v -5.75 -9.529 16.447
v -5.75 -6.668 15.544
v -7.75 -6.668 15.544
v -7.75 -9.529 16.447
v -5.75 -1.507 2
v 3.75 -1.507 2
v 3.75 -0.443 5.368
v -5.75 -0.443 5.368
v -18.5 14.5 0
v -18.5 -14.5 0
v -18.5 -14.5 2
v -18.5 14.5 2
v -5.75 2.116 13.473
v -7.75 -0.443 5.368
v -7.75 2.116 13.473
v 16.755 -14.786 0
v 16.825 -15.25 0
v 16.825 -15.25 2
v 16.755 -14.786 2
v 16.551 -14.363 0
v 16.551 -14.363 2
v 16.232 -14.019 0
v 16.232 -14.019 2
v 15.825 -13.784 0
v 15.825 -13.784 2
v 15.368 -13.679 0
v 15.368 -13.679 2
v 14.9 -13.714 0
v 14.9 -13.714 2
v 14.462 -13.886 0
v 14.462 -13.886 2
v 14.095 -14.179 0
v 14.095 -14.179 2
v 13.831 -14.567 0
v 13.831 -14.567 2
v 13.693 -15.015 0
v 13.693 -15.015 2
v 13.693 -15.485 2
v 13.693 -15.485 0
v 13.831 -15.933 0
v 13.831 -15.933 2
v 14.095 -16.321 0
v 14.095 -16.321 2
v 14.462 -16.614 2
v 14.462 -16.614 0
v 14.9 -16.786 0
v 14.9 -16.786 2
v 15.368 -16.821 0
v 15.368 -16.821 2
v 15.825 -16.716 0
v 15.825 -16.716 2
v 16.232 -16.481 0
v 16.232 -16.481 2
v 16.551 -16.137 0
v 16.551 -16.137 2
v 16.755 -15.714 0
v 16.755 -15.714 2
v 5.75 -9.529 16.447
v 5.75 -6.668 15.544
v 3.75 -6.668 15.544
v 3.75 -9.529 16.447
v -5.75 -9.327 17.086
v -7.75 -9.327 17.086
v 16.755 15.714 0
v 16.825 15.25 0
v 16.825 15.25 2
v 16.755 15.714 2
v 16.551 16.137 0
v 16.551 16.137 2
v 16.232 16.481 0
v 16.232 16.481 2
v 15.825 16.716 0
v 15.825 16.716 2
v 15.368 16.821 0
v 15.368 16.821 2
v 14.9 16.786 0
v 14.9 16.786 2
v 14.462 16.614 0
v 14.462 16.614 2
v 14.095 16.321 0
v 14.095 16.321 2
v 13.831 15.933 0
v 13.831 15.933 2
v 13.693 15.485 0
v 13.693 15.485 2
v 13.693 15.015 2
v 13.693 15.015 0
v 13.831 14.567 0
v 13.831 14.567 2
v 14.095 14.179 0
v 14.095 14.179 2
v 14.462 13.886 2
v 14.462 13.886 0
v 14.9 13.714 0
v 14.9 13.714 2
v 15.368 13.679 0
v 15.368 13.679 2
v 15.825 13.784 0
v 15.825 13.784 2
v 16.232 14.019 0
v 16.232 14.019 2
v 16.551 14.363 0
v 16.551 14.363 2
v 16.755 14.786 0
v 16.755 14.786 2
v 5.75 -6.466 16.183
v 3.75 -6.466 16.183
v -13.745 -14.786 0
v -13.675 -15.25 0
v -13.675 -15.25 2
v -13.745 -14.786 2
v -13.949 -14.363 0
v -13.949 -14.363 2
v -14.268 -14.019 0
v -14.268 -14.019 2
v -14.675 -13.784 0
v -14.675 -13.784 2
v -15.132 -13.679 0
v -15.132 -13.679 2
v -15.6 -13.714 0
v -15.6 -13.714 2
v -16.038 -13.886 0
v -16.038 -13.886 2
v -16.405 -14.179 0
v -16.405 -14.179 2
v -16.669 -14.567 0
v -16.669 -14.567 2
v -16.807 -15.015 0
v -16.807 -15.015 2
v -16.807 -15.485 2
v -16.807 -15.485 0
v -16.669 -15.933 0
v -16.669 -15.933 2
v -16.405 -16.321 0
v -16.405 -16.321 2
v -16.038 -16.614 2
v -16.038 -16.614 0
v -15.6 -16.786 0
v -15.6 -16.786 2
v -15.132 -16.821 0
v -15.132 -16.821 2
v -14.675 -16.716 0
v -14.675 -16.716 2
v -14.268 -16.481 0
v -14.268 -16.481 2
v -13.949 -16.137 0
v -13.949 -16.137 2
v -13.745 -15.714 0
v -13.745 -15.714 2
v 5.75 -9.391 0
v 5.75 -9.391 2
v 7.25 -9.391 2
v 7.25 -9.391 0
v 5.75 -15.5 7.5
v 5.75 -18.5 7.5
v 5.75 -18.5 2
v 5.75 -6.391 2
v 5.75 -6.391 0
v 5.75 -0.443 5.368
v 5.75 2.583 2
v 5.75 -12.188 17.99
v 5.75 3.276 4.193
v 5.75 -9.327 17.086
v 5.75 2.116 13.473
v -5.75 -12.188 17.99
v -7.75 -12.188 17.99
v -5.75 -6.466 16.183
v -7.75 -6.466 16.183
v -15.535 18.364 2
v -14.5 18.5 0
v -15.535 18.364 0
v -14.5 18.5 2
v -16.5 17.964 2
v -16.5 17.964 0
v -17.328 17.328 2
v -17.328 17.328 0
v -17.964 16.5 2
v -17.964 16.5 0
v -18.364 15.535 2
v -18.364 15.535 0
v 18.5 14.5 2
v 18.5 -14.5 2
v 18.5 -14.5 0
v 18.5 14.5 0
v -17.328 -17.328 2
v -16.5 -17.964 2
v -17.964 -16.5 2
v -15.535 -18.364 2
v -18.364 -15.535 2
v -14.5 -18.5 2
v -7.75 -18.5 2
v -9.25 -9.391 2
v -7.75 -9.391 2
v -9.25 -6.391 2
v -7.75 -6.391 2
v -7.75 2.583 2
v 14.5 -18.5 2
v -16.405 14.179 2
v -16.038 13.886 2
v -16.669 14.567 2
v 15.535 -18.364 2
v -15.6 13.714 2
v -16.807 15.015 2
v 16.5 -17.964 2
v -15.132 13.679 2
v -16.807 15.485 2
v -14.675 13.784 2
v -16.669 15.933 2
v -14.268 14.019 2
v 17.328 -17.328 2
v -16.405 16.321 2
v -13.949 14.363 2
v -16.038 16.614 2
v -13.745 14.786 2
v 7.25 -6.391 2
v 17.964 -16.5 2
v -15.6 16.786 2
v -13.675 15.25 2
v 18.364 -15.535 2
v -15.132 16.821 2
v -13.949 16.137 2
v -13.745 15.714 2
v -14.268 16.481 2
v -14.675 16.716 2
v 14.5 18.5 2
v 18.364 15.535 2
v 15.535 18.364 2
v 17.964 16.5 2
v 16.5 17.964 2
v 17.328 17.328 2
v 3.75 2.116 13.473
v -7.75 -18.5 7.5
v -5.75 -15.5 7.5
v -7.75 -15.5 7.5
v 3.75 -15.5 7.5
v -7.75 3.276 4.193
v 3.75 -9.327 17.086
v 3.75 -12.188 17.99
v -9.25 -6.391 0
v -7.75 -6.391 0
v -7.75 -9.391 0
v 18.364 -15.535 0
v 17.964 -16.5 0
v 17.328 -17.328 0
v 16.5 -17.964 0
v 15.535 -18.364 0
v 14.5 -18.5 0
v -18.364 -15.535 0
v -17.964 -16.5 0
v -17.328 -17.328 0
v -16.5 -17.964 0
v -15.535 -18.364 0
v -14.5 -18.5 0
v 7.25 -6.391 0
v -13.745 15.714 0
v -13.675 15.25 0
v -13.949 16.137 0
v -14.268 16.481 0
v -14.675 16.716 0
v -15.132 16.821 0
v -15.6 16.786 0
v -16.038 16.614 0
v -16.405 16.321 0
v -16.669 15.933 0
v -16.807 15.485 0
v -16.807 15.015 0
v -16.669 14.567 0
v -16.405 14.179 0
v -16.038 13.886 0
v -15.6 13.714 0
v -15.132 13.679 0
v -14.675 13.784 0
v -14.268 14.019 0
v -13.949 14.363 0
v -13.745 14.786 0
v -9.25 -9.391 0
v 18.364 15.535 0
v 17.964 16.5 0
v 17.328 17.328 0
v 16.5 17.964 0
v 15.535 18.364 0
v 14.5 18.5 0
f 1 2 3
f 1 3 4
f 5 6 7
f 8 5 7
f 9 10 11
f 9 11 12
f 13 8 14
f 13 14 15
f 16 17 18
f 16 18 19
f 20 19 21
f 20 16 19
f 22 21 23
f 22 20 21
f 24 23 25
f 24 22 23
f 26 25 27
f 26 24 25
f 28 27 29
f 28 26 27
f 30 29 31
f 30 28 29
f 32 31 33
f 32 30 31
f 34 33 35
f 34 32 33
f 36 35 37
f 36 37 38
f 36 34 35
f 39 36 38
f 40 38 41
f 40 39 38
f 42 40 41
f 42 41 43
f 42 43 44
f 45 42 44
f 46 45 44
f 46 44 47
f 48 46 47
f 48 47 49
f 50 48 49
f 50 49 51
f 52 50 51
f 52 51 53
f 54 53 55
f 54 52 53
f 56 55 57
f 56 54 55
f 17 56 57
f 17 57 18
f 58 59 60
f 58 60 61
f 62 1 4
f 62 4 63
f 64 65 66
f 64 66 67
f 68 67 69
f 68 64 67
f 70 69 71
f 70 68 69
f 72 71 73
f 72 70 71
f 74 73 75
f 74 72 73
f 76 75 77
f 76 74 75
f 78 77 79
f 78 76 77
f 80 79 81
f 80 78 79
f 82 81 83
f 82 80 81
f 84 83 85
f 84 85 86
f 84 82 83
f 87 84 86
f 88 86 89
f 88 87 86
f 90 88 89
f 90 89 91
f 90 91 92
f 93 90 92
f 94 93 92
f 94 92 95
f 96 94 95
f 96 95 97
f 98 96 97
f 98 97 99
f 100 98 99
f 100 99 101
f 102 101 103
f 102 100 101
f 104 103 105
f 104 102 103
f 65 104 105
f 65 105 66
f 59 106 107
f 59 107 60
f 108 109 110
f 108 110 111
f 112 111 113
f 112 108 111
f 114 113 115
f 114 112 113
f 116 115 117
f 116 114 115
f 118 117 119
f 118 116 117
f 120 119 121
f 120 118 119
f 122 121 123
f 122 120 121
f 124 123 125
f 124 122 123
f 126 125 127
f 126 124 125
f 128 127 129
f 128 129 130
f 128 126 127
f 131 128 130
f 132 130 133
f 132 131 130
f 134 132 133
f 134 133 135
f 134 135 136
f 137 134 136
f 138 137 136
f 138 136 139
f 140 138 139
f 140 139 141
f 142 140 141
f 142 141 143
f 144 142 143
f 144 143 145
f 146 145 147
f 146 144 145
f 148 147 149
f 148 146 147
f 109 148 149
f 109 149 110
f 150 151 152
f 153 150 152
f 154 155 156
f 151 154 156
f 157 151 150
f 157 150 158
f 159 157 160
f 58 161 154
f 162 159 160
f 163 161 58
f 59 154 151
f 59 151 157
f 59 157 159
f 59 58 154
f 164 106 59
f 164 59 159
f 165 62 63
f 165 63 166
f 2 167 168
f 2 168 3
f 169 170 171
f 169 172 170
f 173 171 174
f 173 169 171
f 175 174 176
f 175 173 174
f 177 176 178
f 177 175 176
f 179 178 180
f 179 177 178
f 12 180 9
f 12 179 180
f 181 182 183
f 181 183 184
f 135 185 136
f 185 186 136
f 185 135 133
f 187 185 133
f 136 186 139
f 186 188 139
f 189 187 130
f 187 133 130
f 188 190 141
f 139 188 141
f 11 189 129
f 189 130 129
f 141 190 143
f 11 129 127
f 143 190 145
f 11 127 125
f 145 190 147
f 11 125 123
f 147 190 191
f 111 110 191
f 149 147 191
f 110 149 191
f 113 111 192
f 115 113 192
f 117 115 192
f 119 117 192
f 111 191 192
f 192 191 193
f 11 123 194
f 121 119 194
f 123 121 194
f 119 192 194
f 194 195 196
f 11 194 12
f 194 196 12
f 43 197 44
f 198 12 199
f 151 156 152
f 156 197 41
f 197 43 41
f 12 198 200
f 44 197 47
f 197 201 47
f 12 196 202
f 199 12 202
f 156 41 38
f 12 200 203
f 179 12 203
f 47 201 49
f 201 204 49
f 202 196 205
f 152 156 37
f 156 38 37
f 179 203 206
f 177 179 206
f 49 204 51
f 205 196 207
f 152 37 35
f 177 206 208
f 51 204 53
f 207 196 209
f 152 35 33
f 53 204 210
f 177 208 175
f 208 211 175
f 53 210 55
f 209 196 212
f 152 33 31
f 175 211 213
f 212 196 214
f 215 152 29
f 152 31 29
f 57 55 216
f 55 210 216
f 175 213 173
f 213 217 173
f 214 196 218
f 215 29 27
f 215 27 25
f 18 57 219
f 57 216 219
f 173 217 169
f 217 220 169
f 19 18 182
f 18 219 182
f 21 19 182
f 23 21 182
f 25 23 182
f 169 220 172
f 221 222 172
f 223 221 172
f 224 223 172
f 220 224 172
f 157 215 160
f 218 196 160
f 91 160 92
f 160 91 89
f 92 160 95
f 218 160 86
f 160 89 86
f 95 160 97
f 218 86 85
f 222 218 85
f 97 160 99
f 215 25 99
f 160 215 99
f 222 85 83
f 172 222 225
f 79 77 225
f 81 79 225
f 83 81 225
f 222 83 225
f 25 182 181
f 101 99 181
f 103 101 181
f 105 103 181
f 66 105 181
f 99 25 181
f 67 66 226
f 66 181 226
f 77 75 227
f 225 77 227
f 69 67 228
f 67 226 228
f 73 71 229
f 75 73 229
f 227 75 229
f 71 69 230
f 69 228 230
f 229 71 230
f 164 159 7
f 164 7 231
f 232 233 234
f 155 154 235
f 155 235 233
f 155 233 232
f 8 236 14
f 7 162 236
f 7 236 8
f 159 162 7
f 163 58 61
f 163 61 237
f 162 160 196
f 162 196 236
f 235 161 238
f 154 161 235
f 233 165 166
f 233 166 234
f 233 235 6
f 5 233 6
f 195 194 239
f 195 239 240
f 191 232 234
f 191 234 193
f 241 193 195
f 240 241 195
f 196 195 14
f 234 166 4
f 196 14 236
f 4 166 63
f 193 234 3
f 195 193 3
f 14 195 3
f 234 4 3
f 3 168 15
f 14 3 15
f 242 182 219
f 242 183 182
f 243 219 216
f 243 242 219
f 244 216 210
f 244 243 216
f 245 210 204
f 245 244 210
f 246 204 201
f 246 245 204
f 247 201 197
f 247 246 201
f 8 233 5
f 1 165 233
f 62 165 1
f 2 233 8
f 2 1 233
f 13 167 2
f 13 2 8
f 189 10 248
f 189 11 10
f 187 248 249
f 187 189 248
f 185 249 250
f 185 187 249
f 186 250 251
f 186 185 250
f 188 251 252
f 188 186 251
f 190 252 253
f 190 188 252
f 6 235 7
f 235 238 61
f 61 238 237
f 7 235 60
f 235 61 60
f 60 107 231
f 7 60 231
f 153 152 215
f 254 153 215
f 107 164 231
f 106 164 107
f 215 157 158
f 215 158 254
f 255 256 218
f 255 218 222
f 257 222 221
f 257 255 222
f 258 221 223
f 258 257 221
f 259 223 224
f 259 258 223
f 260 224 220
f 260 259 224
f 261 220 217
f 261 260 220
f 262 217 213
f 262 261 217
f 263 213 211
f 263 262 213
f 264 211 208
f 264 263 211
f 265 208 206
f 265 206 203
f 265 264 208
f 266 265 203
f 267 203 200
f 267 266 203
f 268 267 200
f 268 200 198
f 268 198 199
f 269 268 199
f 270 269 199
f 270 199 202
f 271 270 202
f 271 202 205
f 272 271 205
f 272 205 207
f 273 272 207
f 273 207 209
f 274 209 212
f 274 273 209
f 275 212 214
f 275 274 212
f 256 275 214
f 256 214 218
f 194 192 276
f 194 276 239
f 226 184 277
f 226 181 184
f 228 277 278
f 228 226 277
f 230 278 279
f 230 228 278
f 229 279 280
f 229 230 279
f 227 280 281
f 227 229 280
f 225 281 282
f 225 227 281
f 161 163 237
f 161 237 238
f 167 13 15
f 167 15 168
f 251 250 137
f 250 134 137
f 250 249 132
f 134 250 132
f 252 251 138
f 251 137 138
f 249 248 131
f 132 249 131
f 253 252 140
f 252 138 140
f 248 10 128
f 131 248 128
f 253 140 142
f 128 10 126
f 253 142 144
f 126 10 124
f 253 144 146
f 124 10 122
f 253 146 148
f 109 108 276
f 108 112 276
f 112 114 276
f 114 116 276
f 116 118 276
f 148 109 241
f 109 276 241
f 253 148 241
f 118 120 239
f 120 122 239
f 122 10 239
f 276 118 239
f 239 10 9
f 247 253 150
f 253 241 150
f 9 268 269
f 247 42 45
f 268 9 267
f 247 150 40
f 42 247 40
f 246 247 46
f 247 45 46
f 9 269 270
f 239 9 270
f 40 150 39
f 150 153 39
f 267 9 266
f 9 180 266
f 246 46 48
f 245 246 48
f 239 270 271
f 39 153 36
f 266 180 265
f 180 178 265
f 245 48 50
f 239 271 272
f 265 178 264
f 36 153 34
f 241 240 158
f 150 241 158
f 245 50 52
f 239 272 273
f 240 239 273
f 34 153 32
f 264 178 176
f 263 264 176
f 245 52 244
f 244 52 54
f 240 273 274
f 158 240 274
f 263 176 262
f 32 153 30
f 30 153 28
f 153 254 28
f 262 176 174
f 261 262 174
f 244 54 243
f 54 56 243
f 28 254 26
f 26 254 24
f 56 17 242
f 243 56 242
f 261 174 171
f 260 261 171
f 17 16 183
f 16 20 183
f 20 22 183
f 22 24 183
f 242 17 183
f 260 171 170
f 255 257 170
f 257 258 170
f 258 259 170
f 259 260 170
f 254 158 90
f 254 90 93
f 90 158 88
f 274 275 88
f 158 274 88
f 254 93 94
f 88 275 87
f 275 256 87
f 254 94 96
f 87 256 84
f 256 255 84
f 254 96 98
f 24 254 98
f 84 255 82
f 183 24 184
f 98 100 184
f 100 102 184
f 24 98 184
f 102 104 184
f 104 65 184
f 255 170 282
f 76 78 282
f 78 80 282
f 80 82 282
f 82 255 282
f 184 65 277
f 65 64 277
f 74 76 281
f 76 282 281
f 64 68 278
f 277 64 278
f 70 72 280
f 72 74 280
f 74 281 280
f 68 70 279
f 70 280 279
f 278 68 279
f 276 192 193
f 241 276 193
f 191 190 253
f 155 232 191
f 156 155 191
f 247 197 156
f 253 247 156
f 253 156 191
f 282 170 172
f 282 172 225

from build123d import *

# Parameters (mm, degrees)
F0_W     = 37
F0_H     = 37
F0_R     = 1.575
F1_DEPTH = 2
F3_DEPTH = 26.25
F4_DEPTH = 24.25
F5_DEPTH = 14.75
F6_DEPTH = 12.75
F7_R     = 4
F8_W     = 1.5
F8_H     = 3
F9_DEPTH = 25


with BuildPart() as f1:
    # F0 (on Top) → F1 (new body)
    with BuildSketch(Plane.XY):
        Rectangle(F0_W, F0_H)
        with Locations((-15.25, -15.25)):
            Circle(F0_R, mode=Mode.SUBTRACT)
        with Locations((15.25, -15.25)):
            Circle(F0_R, mode=Mode.SUBTRACT)
        with Locations((-15.25, 15.25)):
            Circle(F0_R, mode=Mode.SUBTRACT)
        with Locations((15.25, 15.25)):
            Circle(F0_R, mode=Mode.SUBTRACT)
    extrude(amount=F1_DEPTH)

    # F2 (on face) → F3 (join)
    with BuildSketch(Plane.YZ.offset(18.5)):
        Polygon((-12.187941467, 17.9895313658), (-15.5, 7.5), (-1.5066505404, 2), (-0.4433530164, 5.3675409473), (2.1159649409, 13.4730879118), (-6.4663789039, 16.1829539842), (-6.6681133781, 15.5440461646), (-9.5288946597, 16.4473348554), (-9.3271601854, 17.086242675), align=None)
        Polygon((-18.5, 7.5), (-18.5, 2), (-1.5066505404, 2), (-15.5, 7.5), align=None)
        Polygon((-0.4433530164, 5.3675409473), (-1.5066505404, 2), (2.58314132, 2), (3.2756626496, 4.1932656492), align=None)
    extrude(amount=-F3_DEPTH)

    # F2 (on face) → F4 (cut)
    with BuildSketch(Plane.YZ.offset(18.5)):
        Polygon((-15.5, 7.5), (-1.5066505404, 2), (-0.4433530164, 5.3675409473), (2.1159649409, 13.4730879118), (-6.4663789039, 16.1829539842), (-6.6681133781, 15.5440461646), (-9.5288946597, 16.4473348554), (-9.3271601854, 17.086242675), (-12.187941467, 17.9895313658), align=None)
    extrude(amount=-F4_DEPTH, mode=Mode.SUBTRACT)

    # F2 (on face) → F5 (join)
    with BuildSketch(Plane.YZ.offset(18.5)):
        Polygon((-12.187941467, 17.9895313658), (-15.5, 7.5), (-1.5066505404, 2), (-0.4433530164, 5.3675409473), (2.1159649409, 13.4730879118), (-6.4663789039, 16.1829539842), (-6.6681133781, 15.5440461646), (-9.5288946597, 16.4473348554), (-9.3271601854, 17.086242675), align=None)
        Polygon((-18.5, 7.5), (-18.5, 2), (-1.5066505404, 2), (-15.5, 7.5), align=None)
        Polygon((-0.4433530164, 5.3675409473), (-1.5066505404, 2), (2.58314132, 2), (3.2756626496, 4.1932656492), align=None)
    extrude(amount=-F5_DEPTH)

    # F2 (on face) → F6 (cut)
    with BuildSketch(Plane.YZ.offset(18.5)):
        Polygon((-12.187941467, 17.9895313658), (-15.5, 7.5), (-1.5066505404, 2), (-0.4433530164, 5.3675409473), (2.1159649409, 13.4730879118), (-6.4663789039, 16.1829539842), (-6.6681133781, 15.5440461646), (-9.5288946597, 16.4473348554), (-9.3271601854, 17.086242675), align=None)
        Polygon((-18.5, 7.5), (-18.5, 2), (-1.5066505404, 2), (-15.5, 7.5), align=None)
        Polygon((-0.4433530164, 5.3675409473), (-1.5066505404, 2), (2.58314132, 2), (3.2756626496, 4.1932656492), align=None)
    extrude(amount=-F6_DEPTH, mode=Mode.SUBTRACT)

    # F7
    f7_edges = [f1.edges().sort_by_distance(p)[0] for p in [
        (18.5, -18.5, 1),
        (18.5, 18.5, 1),
        (-18.5, 18.5, 1),
        (-18.5, -18.5, 1),
    ]]
    fillet(f7_edges, radius=F7_R)

    # F8 (on face) → F9 (cut)
    with BuildSketch(Plane.XY.offset(2)):
        with Locations((-8.5, -7.8909632415)):
            Rectangle(F8_W, F8_H)
        with Locations((6.5, -7.8909632415)):
            Rectangle(F8_W, F8_H)
    extrude(amount=-F9_DEPTH, mode=Mode.SUBTRACT)


solid = f1.part
